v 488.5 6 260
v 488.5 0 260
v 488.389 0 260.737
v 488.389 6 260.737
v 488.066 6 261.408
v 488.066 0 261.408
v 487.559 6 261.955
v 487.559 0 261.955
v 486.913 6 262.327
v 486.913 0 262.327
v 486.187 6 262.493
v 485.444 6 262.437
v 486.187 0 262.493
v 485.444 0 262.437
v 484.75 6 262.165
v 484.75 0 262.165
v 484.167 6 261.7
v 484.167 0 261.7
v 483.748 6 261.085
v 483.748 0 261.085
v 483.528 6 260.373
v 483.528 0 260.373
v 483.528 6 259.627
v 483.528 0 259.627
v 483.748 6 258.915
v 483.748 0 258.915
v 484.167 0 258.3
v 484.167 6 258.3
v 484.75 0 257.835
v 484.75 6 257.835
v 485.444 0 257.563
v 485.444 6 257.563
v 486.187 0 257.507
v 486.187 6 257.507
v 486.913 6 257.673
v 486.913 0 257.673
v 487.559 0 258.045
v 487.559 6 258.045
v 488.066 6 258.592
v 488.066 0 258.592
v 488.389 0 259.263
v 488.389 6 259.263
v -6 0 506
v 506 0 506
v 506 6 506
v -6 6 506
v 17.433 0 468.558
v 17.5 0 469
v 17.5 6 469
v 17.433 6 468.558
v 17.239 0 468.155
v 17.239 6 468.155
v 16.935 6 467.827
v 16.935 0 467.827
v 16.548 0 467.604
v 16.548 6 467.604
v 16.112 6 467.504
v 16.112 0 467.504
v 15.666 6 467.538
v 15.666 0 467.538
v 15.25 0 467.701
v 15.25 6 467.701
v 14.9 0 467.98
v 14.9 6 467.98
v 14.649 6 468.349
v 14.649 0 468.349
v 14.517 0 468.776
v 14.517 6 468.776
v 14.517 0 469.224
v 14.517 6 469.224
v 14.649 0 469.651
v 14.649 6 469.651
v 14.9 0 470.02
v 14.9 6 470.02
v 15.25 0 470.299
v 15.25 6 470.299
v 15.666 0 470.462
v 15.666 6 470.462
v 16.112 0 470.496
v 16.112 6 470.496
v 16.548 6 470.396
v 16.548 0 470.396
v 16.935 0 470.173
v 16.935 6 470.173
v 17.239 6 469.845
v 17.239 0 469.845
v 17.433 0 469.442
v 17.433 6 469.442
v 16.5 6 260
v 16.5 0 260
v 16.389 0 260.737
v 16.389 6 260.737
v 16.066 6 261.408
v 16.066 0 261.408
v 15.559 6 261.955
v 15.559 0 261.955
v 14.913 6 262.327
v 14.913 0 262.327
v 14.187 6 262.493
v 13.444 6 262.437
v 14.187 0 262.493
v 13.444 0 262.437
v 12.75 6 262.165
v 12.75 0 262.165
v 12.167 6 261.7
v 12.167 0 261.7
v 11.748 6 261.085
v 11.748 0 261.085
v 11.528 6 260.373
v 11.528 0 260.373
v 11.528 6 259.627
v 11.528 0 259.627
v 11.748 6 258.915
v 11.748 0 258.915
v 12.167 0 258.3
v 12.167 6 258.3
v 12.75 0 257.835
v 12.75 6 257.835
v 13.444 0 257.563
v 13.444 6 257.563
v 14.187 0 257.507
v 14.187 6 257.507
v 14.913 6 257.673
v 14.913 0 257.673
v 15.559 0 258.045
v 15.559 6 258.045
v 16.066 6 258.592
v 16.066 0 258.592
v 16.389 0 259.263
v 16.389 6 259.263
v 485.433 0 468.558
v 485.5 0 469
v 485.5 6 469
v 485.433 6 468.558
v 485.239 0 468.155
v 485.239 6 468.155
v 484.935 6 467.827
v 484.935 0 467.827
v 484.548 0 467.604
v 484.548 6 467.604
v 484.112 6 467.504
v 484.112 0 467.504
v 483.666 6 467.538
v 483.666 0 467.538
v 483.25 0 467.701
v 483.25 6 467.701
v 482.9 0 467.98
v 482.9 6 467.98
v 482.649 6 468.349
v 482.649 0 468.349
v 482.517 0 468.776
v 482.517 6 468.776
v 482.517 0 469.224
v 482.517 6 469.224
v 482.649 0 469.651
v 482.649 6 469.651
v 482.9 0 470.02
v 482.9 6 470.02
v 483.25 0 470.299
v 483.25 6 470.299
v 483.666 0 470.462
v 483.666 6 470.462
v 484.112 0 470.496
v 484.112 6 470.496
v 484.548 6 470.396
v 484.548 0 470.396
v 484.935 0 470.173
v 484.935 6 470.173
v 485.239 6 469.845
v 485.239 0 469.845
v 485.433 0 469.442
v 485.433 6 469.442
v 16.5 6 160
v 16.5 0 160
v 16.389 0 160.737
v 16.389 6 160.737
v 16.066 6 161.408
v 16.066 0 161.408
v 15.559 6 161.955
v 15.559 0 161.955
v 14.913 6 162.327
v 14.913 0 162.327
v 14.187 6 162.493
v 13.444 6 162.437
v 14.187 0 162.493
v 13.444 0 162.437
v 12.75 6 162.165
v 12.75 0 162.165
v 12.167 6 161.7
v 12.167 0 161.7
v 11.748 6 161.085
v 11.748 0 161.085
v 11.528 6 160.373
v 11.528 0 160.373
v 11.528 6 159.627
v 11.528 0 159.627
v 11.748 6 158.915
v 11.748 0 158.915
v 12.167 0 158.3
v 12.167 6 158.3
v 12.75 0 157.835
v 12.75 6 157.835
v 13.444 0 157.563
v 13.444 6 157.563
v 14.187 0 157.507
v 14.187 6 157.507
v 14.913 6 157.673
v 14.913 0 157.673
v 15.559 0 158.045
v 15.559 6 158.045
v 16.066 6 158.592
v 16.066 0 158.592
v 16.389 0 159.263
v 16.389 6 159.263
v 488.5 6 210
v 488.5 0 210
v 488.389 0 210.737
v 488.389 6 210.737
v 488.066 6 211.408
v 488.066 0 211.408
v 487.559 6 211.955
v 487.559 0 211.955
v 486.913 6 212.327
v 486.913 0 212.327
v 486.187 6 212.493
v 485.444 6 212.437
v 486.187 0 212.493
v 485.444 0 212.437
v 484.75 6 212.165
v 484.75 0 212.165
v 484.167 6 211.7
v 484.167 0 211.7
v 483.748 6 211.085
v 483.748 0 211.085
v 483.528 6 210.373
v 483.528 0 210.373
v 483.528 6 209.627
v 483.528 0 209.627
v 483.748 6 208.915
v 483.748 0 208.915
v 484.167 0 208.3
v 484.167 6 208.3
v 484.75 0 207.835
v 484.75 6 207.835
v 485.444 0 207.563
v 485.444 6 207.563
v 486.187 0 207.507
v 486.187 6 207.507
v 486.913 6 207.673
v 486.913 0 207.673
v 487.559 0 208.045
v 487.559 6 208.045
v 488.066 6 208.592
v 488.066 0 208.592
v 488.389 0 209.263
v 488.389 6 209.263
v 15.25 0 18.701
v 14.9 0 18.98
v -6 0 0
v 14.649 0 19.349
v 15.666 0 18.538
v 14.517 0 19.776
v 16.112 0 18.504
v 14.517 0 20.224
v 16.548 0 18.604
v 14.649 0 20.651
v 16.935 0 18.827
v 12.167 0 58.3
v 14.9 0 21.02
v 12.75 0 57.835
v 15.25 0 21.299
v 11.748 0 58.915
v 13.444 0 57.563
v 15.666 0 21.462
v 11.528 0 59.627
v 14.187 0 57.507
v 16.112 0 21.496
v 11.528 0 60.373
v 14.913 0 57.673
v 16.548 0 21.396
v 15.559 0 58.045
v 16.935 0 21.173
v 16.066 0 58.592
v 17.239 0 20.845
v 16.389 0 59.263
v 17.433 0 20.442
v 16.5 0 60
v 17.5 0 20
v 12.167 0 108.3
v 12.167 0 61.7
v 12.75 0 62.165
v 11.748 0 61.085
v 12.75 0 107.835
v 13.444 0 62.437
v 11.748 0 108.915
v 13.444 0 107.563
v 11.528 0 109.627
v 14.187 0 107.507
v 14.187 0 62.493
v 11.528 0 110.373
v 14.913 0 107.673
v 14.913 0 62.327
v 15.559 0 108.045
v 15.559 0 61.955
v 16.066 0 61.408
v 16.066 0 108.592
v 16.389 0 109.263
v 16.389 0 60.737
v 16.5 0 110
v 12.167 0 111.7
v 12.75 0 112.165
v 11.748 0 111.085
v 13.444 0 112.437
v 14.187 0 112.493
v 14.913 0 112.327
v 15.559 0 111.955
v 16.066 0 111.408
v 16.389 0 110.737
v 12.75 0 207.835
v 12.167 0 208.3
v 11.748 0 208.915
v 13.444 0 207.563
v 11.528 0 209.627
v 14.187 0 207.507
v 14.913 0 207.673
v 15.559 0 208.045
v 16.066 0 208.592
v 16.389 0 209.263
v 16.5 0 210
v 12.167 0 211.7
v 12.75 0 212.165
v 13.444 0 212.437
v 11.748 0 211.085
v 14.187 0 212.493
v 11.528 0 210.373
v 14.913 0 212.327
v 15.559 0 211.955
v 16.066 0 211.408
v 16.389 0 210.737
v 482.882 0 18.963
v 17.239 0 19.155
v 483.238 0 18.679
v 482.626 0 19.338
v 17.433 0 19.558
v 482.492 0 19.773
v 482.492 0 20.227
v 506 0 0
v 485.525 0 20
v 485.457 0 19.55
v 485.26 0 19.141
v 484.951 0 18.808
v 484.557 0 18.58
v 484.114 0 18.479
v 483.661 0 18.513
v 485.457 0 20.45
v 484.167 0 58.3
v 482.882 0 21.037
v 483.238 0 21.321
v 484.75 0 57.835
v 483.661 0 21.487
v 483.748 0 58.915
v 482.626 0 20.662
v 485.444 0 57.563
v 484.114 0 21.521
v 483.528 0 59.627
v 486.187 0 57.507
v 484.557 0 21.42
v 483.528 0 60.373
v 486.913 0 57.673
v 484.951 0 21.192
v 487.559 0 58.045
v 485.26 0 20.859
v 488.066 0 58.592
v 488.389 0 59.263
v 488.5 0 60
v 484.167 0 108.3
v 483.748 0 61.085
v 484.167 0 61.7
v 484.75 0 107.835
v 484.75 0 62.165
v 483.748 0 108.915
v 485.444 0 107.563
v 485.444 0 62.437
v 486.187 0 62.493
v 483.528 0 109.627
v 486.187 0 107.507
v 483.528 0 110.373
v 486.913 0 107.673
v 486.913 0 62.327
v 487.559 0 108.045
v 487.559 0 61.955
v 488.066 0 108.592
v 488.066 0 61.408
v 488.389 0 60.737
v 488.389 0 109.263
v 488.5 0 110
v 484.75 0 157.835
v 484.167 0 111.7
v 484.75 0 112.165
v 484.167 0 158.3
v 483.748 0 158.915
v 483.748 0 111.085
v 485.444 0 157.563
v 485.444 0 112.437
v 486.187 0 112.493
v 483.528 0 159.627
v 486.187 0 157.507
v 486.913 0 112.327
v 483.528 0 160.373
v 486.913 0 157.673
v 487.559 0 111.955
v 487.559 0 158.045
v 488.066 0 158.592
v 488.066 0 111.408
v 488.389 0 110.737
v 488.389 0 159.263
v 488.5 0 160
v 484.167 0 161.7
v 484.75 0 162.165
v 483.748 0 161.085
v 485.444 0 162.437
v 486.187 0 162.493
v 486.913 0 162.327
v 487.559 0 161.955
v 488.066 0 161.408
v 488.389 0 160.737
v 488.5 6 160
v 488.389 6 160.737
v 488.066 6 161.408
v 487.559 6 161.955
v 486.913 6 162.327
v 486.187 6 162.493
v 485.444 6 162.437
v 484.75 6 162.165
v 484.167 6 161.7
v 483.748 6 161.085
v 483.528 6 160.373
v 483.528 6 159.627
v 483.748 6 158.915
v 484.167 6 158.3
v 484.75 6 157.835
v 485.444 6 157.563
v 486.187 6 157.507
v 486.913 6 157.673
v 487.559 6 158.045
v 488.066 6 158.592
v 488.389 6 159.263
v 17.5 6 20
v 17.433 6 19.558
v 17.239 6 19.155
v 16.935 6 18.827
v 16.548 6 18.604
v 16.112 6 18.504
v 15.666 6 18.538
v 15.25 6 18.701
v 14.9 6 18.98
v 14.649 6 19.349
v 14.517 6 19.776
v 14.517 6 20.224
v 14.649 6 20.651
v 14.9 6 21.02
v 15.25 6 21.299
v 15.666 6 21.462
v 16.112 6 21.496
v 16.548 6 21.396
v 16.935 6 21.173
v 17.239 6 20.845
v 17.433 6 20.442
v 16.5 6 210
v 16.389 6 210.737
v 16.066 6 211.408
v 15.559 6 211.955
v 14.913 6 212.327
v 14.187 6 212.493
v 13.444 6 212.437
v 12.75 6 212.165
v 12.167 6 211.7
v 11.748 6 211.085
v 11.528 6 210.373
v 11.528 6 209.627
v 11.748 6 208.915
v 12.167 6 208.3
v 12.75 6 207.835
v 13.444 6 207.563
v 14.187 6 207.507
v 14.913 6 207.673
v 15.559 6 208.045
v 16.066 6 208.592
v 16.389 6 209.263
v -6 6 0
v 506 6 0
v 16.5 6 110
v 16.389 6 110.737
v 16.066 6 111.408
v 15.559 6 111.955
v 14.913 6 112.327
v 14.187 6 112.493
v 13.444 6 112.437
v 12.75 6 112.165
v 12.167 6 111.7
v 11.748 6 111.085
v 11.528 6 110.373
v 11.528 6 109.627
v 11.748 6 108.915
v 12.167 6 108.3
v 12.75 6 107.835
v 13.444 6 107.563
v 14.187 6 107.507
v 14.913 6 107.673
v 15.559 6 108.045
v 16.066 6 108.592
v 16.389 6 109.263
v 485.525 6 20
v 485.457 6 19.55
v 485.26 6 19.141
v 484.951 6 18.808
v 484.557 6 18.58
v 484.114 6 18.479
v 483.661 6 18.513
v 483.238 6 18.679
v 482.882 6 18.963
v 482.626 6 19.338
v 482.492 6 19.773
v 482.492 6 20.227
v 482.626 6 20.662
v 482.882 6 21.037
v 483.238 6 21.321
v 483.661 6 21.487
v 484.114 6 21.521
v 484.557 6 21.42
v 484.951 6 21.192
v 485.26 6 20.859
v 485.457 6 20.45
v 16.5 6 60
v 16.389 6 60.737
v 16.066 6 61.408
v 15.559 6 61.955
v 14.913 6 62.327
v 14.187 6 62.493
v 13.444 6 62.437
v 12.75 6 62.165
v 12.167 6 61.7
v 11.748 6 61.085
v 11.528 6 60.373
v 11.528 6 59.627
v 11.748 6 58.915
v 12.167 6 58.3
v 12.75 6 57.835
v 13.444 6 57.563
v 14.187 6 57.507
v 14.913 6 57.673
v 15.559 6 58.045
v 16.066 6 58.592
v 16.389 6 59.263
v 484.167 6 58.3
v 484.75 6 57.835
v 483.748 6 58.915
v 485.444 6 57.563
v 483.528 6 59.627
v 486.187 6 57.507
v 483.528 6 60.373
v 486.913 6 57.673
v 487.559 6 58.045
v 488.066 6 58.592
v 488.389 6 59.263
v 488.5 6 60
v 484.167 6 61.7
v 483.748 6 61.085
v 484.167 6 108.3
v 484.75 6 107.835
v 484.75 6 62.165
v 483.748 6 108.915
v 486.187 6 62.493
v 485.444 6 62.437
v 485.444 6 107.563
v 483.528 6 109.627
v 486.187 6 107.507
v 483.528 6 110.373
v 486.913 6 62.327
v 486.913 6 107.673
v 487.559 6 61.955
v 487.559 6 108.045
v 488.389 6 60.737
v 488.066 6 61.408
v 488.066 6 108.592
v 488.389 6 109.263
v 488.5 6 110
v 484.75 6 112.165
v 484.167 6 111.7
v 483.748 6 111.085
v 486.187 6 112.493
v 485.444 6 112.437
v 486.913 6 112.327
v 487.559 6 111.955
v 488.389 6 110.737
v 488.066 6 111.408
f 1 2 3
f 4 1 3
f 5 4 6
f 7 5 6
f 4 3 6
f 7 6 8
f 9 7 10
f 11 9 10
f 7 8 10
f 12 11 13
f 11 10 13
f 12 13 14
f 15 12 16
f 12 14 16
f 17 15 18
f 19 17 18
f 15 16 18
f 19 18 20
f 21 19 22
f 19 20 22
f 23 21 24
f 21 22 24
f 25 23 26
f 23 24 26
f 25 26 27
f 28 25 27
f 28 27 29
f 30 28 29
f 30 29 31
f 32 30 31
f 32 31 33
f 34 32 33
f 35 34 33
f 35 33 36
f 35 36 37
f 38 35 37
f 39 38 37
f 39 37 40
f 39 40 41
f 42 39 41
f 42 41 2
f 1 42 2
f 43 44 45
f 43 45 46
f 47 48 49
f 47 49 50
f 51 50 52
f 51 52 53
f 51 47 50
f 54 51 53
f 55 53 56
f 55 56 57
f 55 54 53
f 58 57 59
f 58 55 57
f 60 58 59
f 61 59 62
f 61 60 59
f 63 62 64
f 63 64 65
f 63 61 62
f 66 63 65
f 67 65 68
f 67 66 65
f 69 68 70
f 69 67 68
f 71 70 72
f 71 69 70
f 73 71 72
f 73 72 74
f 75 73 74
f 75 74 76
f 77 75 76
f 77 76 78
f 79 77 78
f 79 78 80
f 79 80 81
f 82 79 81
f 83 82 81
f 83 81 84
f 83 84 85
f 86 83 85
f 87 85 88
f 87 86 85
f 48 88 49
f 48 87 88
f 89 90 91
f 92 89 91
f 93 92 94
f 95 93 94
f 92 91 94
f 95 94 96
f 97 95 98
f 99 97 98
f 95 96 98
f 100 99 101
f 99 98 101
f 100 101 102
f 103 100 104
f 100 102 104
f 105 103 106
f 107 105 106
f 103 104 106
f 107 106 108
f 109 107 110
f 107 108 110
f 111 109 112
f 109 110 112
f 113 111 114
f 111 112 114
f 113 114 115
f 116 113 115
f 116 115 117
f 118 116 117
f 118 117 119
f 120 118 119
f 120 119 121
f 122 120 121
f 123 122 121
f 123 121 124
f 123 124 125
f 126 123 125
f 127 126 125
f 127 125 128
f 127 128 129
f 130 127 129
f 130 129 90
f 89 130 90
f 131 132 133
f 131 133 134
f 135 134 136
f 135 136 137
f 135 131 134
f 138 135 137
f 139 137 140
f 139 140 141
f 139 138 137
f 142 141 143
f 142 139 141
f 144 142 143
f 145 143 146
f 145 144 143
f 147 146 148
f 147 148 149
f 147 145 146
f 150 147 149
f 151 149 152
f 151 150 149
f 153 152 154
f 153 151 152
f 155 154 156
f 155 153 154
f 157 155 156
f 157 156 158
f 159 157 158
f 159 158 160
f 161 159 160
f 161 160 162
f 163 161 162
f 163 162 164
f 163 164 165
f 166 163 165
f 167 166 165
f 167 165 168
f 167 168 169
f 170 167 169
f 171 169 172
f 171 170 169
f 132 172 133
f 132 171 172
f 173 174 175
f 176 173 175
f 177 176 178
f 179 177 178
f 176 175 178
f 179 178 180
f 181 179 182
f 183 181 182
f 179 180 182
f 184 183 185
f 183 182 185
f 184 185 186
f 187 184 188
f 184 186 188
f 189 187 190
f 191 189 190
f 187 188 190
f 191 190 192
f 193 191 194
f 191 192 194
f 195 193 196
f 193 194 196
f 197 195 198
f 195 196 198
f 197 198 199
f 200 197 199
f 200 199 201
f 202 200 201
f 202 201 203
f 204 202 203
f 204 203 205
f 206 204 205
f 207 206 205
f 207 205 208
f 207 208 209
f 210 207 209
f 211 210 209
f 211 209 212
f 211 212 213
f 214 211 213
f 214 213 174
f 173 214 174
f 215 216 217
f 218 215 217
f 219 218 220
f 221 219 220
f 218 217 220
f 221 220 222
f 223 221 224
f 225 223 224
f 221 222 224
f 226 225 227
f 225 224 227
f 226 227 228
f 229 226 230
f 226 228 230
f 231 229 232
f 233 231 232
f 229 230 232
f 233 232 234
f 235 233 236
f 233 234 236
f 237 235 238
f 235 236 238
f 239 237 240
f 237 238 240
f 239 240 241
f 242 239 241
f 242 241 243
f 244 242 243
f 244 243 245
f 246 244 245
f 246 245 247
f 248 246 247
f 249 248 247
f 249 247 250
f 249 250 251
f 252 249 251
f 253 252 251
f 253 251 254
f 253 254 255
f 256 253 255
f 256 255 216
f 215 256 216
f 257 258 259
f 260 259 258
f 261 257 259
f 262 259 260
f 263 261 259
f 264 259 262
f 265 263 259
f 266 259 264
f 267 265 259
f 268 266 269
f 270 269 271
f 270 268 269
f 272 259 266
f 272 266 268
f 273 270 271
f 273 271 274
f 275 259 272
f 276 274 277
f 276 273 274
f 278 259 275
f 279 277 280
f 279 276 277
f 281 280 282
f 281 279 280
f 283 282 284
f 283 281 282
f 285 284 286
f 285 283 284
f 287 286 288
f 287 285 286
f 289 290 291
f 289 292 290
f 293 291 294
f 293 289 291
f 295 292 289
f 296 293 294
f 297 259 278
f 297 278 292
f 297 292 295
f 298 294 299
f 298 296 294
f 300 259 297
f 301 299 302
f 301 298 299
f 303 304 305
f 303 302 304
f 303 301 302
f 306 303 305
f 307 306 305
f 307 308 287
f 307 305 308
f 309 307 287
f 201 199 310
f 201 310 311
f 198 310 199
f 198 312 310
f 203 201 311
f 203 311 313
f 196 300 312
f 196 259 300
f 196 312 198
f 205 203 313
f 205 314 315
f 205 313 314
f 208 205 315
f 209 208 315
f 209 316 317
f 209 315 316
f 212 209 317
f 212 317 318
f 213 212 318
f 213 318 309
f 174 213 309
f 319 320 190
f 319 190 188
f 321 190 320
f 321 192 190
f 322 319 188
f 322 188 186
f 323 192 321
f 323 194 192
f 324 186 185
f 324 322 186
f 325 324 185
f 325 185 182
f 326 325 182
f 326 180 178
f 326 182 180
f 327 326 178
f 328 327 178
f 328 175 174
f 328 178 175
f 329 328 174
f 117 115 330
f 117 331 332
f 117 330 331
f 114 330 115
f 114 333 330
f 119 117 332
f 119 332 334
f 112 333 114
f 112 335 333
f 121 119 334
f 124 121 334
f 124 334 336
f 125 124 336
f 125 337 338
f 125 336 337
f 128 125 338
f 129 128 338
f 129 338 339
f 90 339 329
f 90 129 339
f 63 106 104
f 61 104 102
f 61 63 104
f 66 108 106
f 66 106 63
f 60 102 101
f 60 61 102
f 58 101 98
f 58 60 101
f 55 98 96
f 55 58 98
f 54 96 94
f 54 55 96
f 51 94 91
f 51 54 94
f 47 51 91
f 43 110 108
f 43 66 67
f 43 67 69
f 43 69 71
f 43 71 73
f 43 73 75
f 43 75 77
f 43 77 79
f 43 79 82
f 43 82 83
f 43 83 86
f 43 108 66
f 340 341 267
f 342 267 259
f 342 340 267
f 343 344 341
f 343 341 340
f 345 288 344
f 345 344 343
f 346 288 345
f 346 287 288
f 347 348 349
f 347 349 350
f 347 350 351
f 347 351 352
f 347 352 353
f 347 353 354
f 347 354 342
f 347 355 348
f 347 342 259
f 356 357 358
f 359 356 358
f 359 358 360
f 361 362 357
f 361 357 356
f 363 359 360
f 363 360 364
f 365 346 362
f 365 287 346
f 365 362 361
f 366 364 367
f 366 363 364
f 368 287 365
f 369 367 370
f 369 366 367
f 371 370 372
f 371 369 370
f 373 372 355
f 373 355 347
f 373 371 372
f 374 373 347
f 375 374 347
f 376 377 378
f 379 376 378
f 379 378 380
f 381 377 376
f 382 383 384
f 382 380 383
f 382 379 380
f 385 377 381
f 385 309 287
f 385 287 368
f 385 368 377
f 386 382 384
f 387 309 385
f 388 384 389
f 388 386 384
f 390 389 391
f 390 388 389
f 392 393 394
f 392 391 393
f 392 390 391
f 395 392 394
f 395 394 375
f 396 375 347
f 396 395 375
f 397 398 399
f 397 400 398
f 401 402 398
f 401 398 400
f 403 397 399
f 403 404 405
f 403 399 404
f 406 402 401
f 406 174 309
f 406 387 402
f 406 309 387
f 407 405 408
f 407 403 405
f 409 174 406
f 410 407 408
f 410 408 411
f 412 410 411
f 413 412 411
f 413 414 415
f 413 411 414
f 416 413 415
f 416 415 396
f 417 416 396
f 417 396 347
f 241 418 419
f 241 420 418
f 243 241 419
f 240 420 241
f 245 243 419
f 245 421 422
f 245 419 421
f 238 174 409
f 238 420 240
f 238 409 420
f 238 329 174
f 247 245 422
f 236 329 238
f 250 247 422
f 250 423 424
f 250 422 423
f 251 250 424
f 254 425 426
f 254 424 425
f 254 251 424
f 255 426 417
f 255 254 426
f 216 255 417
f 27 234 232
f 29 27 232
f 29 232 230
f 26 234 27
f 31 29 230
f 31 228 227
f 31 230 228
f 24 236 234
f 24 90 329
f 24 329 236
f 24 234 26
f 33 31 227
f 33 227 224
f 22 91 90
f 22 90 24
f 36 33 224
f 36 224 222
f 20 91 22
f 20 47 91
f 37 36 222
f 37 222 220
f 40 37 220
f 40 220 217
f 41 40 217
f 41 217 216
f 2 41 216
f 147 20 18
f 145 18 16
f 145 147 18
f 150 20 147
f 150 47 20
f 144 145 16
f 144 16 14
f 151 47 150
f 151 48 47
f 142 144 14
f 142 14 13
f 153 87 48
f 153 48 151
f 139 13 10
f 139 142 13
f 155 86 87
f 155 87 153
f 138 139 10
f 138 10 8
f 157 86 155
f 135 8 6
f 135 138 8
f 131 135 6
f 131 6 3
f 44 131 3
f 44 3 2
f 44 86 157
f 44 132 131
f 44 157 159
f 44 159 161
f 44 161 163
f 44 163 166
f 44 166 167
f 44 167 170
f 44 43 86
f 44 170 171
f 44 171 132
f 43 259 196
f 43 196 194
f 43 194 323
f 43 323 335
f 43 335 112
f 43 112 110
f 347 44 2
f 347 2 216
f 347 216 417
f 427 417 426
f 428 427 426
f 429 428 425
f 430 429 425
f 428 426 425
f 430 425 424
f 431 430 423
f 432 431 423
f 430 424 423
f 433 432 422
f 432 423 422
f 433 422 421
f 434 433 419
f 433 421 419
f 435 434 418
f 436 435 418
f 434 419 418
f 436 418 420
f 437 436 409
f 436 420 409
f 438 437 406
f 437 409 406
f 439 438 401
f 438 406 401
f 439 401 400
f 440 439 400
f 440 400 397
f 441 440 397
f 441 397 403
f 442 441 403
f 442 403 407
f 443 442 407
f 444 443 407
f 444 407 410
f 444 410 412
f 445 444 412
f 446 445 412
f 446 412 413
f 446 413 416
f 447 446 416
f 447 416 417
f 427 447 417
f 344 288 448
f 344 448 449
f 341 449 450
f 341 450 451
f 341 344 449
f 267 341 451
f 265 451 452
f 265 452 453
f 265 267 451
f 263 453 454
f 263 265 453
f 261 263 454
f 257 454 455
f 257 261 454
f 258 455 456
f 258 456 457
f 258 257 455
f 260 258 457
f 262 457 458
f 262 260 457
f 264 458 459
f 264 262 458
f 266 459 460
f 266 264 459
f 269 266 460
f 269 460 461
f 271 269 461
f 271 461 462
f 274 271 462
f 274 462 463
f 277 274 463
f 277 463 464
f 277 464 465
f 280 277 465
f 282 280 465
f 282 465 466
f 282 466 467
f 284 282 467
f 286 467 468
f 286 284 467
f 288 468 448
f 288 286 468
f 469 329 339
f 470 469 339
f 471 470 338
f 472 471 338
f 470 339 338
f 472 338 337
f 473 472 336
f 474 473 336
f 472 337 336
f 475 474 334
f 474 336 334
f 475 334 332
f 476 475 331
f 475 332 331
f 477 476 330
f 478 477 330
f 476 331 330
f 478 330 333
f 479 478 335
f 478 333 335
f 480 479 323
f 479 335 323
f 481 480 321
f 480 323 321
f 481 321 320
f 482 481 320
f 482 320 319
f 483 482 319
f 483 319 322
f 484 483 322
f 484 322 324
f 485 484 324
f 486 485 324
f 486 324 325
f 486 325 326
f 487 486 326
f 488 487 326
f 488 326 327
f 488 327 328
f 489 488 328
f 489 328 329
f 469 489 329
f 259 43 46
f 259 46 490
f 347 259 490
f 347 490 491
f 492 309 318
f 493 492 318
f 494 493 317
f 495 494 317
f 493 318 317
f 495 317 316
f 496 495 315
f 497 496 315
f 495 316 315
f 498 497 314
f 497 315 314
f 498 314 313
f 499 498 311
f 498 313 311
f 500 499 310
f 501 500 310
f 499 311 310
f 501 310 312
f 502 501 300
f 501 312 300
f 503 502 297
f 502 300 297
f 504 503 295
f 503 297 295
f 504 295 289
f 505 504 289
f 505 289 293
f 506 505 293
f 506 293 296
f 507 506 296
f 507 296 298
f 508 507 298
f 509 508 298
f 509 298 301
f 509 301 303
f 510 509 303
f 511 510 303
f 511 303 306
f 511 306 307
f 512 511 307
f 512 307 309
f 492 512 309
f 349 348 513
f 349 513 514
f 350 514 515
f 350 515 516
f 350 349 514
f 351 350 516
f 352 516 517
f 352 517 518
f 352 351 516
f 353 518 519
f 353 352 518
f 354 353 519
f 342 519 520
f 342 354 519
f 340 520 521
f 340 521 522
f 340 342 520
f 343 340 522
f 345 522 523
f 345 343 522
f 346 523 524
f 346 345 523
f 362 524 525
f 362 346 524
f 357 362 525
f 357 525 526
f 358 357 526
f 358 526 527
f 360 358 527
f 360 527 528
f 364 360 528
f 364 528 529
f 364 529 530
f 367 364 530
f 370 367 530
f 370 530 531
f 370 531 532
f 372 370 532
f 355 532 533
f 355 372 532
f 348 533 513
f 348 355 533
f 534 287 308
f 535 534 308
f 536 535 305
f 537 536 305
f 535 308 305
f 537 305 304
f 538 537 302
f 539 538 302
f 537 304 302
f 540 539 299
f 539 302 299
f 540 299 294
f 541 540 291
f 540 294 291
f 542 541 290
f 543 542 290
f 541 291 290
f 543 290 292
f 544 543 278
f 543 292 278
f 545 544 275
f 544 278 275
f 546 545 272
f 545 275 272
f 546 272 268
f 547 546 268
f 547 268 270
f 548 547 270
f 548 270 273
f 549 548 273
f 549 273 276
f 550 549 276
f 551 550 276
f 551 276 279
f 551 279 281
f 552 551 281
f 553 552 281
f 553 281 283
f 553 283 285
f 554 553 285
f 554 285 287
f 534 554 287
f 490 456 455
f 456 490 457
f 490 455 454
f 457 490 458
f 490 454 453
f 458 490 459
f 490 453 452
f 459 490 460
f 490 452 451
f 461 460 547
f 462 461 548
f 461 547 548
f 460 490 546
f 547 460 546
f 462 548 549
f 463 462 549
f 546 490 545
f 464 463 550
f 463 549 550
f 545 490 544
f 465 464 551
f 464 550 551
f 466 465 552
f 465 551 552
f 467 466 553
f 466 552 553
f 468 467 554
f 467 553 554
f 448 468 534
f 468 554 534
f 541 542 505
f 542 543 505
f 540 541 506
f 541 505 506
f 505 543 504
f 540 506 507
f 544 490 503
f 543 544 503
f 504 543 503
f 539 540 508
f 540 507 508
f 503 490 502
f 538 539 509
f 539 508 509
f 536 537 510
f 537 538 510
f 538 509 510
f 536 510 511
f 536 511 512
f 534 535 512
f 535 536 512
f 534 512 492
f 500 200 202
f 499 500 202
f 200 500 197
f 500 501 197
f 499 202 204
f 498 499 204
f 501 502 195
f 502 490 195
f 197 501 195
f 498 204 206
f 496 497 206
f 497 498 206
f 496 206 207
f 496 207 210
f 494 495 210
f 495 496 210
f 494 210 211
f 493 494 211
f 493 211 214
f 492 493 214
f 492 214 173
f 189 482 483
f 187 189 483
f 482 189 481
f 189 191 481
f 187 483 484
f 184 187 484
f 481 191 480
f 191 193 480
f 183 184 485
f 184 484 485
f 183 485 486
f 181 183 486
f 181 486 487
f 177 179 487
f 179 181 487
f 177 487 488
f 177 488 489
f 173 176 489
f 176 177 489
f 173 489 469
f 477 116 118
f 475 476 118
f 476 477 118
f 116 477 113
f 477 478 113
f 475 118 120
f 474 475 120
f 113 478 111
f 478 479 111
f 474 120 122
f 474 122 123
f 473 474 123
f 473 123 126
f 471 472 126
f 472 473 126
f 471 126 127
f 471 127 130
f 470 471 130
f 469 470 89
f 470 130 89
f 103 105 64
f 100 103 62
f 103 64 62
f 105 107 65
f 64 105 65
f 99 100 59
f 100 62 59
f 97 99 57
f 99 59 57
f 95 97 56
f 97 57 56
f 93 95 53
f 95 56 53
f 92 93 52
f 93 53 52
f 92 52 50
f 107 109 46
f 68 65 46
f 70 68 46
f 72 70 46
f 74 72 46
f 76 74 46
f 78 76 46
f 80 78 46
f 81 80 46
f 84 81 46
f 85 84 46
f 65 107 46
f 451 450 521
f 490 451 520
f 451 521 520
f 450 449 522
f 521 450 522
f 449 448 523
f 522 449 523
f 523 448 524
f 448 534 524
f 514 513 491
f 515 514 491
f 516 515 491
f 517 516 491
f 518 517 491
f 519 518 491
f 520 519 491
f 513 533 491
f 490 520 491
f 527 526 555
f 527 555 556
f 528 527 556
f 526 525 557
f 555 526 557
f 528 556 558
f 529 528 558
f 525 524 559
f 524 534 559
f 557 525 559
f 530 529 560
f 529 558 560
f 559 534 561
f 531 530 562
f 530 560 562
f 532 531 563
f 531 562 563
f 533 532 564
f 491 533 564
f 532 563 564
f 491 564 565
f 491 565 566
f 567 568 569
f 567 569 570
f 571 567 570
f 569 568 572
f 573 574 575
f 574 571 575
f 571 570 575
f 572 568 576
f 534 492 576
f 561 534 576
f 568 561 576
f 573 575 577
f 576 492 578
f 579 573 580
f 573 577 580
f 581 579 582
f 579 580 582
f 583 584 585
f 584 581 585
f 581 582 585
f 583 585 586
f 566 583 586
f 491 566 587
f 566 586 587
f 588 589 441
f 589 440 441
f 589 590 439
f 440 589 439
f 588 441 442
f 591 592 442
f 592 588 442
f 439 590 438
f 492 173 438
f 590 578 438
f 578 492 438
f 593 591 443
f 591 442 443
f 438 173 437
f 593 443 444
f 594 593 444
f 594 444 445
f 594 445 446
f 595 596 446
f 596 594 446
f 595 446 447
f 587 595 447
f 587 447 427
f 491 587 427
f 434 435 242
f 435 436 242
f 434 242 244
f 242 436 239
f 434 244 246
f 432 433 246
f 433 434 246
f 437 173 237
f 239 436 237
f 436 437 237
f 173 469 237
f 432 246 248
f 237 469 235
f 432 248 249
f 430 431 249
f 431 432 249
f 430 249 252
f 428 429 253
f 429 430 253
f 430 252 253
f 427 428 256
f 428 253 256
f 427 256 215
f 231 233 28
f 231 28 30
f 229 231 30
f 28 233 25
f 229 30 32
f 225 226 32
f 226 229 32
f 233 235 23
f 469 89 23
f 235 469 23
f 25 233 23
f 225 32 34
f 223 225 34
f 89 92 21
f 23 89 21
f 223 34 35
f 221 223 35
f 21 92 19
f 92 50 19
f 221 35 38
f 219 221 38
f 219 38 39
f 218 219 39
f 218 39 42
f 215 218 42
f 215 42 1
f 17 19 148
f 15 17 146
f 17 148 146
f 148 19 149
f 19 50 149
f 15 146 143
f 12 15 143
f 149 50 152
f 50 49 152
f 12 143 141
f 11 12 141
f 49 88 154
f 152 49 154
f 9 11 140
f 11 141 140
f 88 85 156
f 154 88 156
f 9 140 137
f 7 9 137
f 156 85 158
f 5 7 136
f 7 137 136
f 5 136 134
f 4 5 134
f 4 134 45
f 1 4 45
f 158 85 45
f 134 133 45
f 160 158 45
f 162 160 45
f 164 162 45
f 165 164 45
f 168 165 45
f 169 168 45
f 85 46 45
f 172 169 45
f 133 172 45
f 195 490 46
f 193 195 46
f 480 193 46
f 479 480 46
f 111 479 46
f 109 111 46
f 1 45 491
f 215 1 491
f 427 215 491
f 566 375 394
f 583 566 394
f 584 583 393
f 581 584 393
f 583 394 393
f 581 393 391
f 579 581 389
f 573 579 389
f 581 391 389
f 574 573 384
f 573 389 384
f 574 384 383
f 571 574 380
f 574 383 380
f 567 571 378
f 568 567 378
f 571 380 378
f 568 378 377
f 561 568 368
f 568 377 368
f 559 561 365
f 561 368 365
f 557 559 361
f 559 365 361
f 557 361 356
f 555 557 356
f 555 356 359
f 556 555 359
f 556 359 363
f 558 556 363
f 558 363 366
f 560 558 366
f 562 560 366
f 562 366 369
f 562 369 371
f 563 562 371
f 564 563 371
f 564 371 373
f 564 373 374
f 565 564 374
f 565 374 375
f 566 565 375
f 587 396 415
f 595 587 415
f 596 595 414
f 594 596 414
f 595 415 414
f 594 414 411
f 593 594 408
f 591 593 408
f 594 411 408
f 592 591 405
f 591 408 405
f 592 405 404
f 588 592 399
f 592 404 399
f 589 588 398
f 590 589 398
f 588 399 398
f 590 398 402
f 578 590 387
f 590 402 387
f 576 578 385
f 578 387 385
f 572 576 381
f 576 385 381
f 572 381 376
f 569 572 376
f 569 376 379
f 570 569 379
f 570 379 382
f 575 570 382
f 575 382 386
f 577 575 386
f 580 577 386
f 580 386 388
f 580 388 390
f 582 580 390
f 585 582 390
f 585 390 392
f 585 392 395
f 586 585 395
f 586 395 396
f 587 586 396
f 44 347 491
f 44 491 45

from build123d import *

# Parameters (mm, degrees)
SKETCH1_W           = 500
SKETCH1_H           = 500
SKETCH1_R           = 1.525
SKETCH1_R_2         = 1.5
BOSS_EXTRUDE1_DEPTH = 6
BOSS_EXTRUDE2_DEPTH = 6
SKETCH3_R           = 2.5
CUT_EXTRUDE1_DEPTH  = 7


with BuildPart() as part:
    # Sketch1 → Boss-Extrude1 (new body)
    with BuildSketch(Plane(origin=(0, 0, 0), x_dir=(1, 0, 0), z_dir=(0, 1, 0))):
        with Locations((250, -250)):
            Rectangle(SKETCH1_W, SKETCH1_H)
        with Locations((484, -20)):
            Circle(SKETCH1_R, mode=Mode.SUBTRACT)
        with Locations((16, -20)):
            Circle(SKETCH1_R_2, mode=Mode.SUBTRACT)
        with Locations((484, -469)):
            Circle(SKETCH1_R_2, mode=Mode.SUBTRACT)
        with Locations((16, -469)):
            Circle(SKETCH1_R_2, mode=Mode.SUBTRACT)
    extrude(amount=BOSS_EXTRUDE1_DEPTH)

    # Sketch2 → Boss-Extrude2 (add)
    with BuildSketch(Plane.XZ):
        Polygon((-6, 506), (-6, 0), (0, 0), (0, 500), (500, 500), (500, 0), (506, 0), (506, 506), align=None)
    extrude(amount=-BOSS_EXTRUDE2_DEPTH)

    # Sketch3 → Cut-Extrude1 (cut, through all)
    with BuildSketch(Plane.XZ):
        with Locations((14, 60)):
            Circle(SKETCH3_R)
        with Locations((14, 110)):
            Circle(SKETCH3_R)
        with Locations((14, 160)):
            Circle(SKETCH3_R)
        with Locations((14, 210)):
            Circle(SKETCH3_R)
        with Locations((14, 260)):
            Circle(SKETCH3_R)
        with Locations((486, 60)):
            Circle(SKETCH3_R)
        with Locations((486, 110)):
            Circle(SKETCH3_R)
        with Locations((486, 160)):
            Circle(SKETCH3_R)
        with Locations((486, 210)):
            Circle(SKETCH3_R)
        with Locations((486, 260)):
            Circle(SKETCH3_R)
    extrude(amount=-CUT_EXTRUDE1_DEPTH, mode=Mode.SUBTRACT)


solid = part.part
